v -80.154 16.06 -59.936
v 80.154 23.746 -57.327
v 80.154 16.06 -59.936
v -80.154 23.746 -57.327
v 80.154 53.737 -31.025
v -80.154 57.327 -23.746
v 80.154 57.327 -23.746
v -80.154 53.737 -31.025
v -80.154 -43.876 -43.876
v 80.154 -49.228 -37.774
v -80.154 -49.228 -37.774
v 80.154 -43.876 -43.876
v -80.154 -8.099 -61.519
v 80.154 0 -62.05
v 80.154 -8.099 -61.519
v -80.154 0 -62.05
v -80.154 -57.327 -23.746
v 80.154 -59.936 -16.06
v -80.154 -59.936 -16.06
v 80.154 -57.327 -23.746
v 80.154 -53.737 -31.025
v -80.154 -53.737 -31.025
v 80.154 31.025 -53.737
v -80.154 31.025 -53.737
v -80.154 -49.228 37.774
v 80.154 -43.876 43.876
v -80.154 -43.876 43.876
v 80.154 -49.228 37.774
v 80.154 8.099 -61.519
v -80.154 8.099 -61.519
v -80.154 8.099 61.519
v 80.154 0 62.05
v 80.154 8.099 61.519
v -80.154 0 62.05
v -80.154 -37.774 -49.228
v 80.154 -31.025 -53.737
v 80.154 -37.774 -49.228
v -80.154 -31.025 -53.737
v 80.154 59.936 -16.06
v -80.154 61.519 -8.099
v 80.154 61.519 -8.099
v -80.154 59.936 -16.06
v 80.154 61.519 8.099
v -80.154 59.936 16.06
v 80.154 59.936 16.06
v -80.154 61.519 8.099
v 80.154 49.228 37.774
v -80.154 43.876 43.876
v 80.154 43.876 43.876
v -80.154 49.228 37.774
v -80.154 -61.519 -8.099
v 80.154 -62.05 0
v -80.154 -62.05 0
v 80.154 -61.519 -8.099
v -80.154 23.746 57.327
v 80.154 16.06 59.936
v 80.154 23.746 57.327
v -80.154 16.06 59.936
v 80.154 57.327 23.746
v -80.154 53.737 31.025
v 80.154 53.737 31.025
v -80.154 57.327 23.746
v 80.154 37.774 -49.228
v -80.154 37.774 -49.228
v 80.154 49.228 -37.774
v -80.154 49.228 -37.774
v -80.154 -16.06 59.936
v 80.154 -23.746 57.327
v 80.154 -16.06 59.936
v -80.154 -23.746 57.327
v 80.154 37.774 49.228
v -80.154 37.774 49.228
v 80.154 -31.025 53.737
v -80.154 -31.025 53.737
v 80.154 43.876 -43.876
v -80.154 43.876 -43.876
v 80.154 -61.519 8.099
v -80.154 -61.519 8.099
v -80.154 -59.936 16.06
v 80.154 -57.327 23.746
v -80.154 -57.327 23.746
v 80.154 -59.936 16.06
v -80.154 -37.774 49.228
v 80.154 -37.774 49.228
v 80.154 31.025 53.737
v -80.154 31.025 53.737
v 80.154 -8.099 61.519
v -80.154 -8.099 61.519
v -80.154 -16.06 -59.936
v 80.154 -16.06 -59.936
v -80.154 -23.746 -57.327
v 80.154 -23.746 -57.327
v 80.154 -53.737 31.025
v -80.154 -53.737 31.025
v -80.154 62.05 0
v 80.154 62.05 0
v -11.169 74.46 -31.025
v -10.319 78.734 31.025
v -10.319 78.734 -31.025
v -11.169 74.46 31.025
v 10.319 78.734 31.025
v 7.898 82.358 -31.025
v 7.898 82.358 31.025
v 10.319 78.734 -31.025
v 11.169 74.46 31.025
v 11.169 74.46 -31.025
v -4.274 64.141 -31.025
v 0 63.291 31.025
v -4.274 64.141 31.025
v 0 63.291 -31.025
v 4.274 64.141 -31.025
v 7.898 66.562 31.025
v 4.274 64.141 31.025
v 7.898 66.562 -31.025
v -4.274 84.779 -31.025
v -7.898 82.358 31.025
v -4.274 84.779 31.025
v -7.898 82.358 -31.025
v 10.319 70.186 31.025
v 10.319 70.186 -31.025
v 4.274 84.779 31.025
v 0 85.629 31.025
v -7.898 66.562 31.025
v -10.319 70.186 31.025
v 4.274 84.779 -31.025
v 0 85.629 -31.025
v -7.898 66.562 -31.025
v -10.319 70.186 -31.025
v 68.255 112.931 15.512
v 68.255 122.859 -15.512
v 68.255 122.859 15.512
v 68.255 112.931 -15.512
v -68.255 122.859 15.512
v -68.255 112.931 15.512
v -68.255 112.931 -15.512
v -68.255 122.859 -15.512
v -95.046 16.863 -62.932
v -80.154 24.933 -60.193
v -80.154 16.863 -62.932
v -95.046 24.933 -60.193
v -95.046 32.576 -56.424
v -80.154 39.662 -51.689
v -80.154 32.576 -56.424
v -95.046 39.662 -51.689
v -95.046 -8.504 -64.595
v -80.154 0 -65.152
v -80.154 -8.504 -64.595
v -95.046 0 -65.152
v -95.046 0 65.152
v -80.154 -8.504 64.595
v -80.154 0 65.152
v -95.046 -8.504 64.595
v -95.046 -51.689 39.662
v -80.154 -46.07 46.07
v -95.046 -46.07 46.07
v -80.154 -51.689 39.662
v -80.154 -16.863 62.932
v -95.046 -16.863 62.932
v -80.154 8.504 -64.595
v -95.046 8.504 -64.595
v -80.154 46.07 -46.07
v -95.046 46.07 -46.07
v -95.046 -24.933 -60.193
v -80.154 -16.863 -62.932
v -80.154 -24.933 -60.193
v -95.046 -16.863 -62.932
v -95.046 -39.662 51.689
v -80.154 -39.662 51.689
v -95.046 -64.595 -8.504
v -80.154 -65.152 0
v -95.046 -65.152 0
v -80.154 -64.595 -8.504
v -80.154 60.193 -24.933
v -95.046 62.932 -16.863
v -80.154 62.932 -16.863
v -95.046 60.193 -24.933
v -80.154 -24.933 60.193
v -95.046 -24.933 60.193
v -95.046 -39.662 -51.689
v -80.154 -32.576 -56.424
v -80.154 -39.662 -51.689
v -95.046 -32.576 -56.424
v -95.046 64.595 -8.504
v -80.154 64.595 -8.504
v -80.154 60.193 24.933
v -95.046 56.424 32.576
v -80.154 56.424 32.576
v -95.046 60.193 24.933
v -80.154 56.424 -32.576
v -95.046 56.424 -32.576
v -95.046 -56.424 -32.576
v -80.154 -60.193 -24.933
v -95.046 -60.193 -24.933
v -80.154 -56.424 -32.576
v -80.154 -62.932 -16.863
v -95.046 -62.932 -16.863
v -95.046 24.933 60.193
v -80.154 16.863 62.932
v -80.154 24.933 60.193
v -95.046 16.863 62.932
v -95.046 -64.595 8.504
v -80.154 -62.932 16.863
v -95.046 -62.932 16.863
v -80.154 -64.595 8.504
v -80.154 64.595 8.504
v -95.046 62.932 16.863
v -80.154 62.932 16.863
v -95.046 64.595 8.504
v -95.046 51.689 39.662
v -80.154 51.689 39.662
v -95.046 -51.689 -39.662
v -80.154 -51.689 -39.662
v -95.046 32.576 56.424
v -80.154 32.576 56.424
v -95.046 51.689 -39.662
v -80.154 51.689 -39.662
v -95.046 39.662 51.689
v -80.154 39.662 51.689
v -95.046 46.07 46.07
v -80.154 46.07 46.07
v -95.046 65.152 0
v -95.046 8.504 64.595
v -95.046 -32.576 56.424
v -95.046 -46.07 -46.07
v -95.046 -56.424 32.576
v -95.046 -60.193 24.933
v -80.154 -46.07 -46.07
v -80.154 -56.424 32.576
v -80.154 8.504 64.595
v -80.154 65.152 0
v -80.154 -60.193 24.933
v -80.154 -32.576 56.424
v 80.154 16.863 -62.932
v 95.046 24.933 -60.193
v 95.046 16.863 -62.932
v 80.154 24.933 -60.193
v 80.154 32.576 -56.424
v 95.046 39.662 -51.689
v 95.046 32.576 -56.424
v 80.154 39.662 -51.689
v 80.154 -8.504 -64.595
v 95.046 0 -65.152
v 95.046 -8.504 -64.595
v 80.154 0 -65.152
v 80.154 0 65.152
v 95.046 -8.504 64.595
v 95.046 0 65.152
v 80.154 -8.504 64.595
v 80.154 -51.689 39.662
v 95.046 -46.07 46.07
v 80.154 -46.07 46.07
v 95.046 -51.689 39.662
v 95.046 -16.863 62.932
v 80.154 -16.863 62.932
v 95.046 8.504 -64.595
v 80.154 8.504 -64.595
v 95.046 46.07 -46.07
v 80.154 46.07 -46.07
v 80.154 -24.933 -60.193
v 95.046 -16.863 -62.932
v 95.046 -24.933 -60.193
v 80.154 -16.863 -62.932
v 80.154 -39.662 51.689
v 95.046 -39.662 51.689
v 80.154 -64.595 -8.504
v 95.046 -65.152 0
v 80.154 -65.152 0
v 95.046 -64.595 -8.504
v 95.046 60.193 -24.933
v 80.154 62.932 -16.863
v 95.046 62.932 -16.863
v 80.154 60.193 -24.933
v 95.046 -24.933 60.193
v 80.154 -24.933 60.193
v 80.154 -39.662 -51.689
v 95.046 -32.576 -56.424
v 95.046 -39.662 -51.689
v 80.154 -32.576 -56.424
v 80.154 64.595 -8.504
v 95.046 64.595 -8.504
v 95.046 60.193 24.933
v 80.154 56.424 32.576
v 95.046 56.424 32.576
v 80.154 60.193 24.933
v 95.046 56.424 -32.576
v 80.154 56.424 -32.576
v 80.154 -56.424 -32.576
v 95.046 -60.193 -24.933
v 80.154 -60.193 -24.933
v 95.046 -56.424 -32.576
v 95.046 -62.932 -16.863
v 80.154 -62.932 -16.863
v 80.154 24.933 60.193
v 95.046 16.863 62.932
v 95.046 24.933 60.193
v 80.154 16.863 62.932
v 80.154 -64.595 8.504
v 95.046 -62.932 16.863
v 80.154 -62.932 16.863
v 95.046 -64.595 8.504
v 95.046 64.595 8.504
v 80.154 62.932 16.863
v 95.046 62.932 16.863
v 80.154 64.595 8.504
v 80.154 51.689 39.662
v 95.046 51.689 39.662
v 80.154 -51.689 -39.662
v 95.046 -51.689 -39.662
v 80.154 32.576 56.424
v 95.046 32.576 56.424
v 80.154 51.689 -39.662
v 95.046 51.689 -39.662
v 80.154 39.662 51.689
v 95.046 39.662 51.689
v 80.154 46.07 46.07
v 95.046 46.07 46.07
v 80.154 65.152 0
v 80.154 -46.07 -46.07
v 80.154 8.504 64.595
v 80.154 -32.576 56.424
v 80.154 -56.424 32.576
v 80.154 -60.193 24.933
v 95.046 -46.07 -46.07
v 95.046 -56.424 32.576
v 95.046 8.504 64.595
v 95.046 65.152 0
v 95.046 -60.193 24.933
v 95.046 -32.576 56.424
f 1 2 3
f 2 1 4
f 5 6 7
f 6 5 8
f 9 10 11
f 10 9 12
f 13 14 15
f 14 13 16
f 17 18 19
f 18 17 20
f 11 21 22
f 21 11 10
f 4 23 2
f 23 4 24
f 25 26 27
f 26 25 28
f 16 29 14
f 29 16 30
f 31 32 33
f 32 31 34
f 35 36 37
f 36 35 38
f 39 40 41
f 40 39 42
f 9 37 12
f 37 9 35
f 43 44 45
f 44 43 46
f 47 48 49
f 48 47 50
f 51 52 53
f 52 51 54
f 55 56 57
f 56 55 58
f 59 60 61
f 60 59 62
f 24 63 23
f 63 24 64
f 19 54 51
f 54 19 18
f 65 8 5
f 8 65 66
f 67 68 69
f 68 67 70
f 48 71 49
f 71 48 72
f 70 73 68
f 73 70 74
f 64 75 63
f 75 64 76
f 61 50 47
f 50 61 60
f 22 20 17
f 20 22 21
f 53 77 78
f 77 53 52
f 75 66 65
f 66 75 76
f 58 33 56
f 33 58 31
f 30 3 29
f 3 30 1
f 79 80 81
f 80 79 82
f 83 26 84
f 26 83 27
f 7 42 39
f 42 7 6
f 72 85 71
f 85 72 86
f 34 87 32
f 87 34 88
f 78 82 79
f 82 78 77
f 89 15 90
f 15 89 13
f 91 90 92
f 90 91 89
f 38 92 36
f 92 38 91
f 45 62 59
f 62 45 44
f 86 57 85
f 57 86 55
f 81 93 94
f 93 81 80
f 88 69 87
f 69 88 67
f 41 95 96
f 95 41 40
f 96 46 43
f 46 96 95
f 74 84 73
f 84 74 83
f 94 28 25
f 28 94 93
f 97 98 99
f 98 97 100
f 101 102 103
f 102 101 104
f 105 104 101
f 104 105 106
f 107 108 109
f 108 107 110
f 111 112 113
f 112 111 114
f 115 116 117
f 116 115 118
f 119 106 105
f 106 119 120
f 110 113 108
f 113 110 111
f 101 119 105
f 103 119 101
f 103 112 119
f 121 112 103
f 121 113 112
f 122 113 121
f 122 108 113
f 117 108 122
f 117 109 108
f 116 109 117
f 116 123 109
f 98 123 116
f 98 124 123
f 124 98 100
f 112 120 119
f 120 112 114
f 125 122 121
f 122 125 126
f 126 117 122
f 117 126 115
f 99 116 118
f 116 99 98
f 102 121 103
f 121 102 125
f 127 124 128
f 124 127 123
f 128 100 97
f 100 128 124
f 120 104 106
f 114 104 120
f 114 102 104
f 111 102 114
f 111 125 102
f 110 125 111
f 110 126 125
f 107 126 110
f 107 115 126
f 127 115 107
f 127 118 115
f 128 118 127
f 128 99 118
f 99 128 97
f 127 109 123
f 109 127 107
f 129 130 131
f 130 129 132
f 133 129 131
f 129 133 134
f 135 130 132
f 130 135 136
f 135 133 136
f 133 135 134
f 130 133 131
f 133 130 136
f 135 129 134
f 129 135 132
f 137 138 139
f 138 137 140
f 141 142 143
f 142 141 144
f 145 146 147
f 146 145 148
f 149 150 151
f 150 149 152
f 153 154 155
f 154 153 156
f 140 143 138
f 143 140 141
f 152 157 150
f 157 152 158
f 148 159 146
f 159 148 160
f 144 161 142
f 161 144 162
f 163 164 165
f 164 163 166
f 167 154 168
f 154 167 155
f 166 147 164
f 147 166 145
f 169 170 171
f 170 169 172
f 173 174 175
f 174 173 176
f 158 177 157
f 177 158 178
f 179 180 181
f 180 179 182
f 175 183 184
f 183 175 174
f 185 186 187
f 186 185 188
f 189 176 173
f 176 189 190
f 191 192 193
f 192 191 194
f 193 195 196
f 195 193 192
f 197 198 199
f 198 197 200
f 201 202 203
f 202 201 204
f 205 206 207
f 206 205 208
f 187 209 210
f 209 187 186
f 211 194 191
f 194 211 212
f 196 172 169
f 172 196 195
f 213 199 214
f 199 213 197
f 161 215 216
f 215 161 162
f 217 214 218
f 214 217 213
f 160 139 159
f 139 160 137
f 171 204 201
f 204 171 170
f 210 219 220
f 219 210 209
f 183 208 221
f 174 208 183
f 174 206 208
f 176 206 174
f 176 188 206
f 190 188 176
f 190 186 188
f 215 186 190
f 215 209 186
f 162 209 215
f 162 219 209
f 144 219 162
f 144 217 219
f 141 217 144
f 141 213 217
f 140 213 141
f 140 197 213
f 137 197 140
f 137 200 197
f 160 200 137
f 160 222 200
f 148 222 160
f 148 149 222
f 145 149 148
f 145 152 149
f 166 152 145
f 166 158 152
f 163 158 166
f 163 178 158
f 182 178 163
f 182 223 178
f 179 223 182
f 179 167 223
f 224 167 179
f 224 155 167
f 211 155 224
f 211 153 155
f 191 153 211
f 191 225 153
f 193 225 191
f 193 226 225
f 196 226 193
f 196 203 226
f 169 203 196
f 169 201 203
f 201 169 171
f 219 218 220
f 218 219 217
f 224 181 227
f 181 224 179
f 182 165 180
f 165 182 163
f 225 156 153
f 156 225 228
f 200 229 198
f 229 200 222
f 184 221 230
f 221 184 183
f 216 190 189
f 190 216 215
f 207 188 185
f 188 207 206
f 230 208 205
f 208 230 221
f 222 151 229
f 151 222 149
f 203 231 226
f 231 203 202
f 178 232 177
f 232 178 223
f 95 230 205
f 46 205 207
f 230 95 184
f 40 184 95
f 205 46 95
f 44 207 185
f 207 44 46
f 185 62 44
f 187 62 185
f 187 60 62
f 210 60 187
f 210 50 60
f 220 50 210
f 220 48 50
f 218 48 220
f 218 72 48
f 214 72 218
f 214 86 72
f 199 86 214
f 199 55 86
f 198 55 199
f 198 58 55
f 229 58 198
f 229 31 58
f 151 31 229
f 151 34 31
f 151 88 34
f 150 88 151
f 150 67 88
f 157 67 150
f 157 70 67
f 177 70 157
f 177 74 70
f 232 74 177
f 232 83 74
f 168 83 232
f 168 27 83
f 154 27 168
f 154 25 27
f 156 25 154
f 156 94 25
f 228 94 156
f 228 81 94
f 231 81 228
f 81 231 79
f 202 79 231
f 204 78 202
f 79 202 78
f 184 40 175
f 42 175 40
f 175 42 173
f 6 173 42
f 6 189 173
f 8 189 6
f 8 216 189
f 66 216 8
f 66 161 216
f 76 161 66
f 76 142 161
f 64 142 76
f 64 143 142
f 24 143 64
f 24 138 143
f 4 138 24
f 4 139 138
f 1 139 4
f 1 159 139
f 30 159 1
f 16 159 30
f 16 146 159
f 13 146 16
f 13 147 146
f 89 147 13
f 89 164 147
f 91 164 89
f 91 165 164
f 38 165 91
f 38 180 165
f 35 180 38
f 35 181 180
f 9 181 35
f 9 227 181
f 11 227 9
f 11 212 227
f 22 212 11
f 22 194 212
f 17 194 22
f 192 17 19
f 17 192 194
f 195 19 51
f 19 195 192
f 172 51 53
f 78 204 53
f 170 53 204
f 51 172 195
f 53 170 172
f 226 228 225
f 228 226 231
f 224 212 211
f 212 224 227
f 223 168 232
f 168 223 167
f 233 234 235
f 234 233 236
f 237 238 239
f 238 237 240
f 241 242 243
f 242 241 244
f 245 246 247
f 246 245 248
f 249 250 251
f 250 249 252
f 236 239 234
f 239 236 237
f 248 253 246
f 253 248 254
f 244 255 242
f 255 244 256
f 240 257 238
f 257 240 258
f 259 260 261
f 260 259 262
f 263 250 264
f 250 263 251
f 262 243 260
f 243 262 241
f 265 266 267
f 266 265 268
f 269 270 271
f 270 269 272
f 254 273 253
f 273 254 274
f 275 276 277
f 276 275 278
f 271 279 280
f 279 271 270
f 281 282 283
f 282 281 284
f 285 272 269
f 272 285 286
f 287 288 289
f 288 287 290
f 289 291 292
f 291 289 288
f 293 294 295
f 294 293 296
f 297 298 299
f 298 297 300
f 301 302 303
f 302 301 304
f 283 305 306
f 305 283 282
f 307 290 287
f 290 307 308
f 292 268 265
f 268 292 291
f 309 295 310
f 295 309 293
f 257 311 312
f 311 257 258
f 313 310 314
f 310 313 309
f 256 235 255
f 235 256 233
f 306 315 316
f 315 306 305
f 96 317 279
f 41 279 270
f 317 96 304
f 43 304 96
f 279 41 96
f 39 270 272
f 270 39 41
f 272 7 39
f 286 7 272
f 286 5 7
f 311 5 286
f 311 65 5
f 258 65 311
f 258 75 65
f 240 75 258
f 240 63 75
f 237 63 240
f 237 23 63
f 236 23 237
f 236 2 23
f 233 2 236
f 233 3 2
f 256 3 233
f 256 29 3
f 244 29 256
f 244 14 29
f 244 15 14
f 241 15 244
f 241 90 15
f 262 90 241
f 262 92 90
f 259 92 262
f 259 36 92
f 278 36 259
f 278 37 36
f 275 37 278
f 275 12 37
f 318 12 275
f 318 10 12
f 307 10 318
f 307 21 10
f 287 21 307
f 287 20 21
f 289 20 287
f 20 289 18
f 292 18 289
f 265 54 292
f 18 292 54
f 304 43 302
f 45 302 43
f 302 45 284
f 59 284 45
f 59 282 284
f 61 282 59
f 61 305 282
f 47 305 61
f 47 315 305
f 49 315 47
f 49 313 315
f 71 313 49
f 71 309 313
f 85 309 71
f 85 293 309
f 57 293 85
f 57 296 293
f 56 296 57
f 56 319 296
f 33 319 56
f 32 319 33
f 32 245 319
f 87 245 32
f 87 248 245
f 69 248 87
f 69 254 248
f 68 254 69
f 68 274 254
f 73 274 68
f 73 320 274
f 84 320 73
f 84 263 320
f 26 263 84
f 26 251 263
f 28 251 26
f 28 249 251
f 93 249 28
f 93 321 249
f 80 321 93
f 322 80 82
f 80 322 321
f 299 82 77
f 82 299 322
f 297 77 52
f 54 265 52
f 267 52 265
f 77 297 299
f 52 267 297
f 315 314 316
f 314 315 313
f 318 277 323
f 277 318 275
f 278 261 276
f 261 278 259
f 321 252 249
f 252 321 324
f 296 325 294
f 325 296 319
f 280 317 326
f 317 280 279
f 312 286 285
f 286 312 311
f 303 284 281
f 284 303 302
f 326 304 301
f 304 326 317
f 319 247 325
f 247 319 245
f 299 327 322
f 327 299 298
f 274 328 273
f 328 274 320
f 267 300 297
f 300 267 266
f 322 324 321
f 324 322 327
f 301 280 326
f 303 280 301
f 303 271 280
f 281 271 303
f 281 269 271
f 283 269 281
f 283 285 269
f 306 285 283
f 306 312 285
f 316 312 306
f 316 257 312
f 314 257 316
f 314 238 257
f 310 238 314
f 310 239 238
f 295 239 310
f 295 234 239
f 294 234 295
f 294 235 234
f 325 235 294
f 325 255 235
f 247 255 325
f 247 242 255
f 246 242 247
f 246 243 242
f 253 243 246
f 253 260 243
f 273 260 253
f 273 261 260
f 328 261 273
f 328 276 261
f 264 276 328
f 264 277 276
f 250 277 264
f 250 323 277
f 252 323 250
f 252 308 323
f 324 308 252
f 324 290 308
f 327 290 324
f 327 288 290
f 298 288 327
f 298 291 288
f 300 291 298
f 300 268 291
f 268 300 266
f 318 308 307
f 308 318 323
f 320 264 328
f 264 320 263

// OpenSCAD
// Auto-generated by scripts/author_from_manifest.py (Phase D.3).
// Source: data/phase_d_manifest.json (sku_intent='viking-f1-dry-pipe-2.5in').
// Do not hand-edit — regenerate from the manifest.
//
// @part viking_f1_dry_pipe_2_5in
// @kind valve
// @category valve.dry.pipe
// @display-name "Viking Model F-1 Dry-Pipe Valve 2.5\""
// @mfg viking_group
// @mfg-pn F-1
// @listing UL FM
// @price-usd 870.00
// @install-minutes 60
// @crew foreman
// @param size_in number default=2.5 label="Size" unit="in"
// @port inlet position=[-0.05,0,0] direction=[-1,0,0] style=grooved size_in=2.5 role=run_a
// @port outlet position=[0.05,0,0] direction=[1,0,0] style=grooved size_in=2.5 role=run_b

size_in = 2.5;

function od_mm(nps) =
    nps ==   1  ? 33.4 :
    nps == 1.25 ? 42.2 :
    nps == 1.5  ? 48.3 :
    nps ==   2  ? 60.3 :
    nps == 2.5  ? 73.0 :
    nps ==   3  ? 88.9 :
    nps ==   4  ? 114.3 :
    nps ==   6  ? 168.3 :
    nps ==   8  ? 219.1 : 73.0;

od = od_mm(size_in);
body_len = od * 2.4;
body_d   = od * 1.7;

union() {
    // Valve body
    rotate([0, 90, 0])
        cylinder(h = body_len, d = body_d, center = true, $fn = 48);
    // Stem / handle indicator
    translate([0, body_d * 0.6, 0])
        cylinder(h = body_d * 0.5, d = body_d * 0.18, center = true, $fn = 16);
    translate([0, body_d * 0.95, 0])
        cube([body_d * 1.1, body_d * 0.08, body_d * 0.25], center = true);
    // End flanges
    translate([-body_len/2, 0, 0])
        rotate([0, 90, 0])
        cylinder(h = body_d * 0.12, d = body_d * 1.05, center = true, $fn = 48);
    translate([ body_len/2, 0, 0])
        rotate([0, 90, 0])
        cylinder(h = body_d * 0.12, d = body_d * 1.05, center = true, $fn = 48);
}
